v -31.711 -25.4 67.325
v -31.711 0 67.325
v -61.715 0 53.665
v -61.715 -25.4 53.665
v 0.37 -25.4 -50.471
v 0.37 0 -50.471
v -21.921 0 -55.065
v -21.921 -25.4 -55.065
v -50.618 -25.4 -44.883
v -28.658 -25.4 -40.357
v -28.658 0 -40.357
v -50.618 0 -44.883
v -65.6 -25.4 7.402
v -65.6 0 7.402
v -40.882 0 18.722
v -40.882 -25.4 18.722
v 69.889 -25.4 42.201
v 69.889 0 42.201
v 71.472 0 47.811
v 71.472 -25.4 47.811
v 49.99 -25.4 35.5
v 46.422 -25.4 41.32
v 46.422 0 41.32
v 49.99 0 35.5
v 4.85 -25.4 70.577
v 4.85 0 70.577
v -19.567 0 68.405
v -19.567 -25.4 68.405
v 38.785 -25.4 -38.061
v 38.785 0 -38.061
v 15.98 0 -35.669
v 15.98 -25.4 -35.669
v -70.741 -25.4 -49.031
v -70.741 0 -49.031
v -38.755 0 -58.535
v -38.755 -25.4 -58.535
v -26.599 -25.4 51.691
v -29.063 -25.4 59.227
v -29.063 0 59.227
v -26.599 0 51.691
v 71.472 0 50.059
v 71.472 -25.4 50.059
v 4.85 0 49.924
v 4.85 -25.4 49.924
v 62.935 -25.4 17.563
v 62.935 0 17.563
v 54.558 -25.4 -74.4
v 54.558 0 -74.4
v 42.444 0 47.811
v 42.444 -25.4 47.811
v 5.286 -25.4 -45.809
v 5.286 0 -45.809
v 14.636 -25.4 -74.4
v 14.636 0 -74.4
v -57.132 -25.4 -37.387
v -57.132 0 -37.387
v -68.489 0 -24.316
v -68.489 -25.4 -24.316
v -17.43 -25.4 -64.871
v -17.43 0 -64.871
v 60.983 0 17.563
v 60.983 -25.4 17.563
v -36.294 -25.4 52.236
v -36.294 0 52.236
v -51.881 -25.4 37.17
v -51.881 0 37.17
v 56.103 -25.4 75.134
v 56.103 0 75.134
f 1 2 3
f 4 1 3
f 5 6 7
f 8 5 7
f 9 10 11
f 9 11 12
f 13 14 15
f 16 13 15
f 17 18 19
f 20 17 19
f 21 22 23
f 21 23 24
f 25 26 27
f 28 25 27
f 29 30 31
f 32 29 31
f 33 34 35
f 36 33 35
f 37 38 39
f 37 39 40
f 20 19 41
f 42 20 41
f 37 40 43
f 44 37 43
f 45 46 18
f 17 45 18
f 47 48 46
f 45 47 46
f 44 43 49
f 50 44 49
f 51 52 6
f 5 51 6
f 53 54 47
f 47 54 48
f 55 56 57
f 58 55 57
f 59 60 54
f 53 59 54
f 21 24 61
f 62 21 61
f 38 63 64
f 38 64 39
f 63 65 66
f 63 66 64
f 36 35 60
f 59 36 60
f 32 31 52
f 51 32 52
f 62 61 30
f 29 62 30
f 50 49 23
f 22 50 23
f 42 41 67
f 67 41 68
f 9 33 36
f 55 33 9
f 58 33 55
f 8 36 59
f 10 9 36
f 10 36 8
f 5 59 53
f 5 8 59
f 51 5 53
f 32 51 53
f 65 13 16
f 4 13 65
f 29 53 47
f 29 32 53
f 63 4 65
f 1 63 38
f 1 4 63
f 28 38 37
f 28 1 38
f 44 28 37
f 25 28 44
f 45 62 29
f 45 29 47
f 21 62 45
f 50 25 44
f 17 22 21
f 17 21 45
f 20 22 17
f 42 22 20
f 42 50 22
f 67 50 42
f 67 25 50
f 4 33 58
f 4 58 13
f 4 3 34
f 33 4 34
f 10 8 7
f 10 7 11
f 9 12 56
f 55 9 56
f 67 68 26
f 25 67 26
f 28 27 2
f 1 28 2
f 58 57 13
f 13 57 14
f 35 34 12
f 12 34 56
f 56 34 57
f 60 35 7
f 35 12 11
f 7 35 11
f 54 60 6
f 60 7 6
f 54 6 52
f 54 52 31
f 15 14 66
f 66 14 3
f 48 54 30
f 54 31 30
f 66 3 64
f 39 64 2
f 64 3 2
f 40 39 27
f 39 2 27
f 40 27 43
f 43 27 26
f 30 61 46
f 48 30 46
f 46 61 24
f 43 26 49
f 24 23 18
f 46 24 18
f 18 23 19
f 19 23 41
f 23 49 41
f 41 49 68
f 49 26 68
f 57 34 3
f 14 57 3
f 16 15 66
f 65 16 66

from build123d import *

# Parameters (mm, degrees)
F1_DEPTH = 25.4


with BuildPart() as f1:
    # F0 (on Front) → F1 (new body)
    with BuildSketch(Plane.XZ):
        Polygon((-29.0627366167, 59.2265195809), (-26.5986134675, 51.6914901655), (4.8500286105, 49.9238849428), (4.8500286105, 70.576620616), (-19.5671229655, 68.4053798518), align=None)
        Polygon((31.3274671897, 72.9310678085), (4.8500286105, 49.9238849428), (42.4443297088, 47.8108562529), align=None)
        Polygon((4.8500286105, 70.576620616), (4.8500286105, 49.9238849428), (31.3274671897, 72.9310678085), align=None)
        Polygon((-36.2940447313, 52.2364324526), (-29.0627366167, 59.2265195809), (-31.7112803459, 67.3254877329), (-61.7150329053, 53.6652468145), align=None)
        Polygon((-31.7112803459, 67.3254877329), (-29.0627366167, 59.2265195809), (-19.5671229655, 68.4053798518), align=None)
        Polygon((-51.8806073309, 37.1698042746), (-36.2940447313, 52.2364324526), (-61.7150329053, 53.6652468145), align=None)
        Polygon((-65.600423, 7.4018295103), (-40.8824269365, 18.7223767795), (-51.8806073309, 37.1698042746), (-61.7150329053, 53.6652468145), (-70.7405507565, -49.0305200219), (-68.4894029233, -24.315655452), align=None)
        Polygon((71.4723467827, 47.8108562529), (42.4443297088, 47.8108562529), (46.4224250242, 41.3202796856), (69.8888571857, 42.2007769877), align=None)
        Polygon((56.1034718341, 75.1342187818), (42.4443297088, 47.8108562529), (71.4723467827, 47.8108562529), (71.4723467827, 50.058685971), align=None)
        Polygon((31.3274671897, 72.9310678085), (42.4443297088, 47.8108562529), (56.1034718341, 75.1342187818), align=None)
        Polygon((69.8888571857, 42.2007769877), (46.4224250242, 41.3202796856), (49.9897200646, 35.4999561987), align=None)
        Polygon((15.9801721379, -35.6691343344), (5.2863502547, -45.8093752593), (14.6359754726, -74.3995457888), (38.7853346765, -38.0608700216), align=None)
        Polygon((14.6359754726, -74.3995457888), (5.2863502547, -45.8093752593), (0.3700881163, -50.4711400688), align=None)
        Polygon((-57.13157103, -37.3866297692), (-68.4894029233, -24.315655452), (-70.7405507565, -49.0305200219), align=None)
        Polygon((-57.13157103, -37.3866297692), (-70.7405507565, -49.0305200219), (-50.6175059134, -44.8832346352), align=None)
        Polygon((-50.6175059134, -44.8832346352), (-70.7405507565, -49.0305200219), (-38.7552418775, -58.5347263998), align=None)
        Polygon((69.8888571857, 42.2007769877), (49.9897200646, 35.4999561987), (60.9832331538, 17.5631716847), (62.9346966743, 17.5631716847), align=None)
        Polygon((-17.4304527242, -64.8712353842), (14.6359754726, -74.3995457888), (0.3700881163, -50.4711400688), (-21.9214353892, -55.0653409168), align=None)
        Polygon((38.7853346765, -38.0608700216), (14.6359754726, -74.3995457888), (54.5582934135, -74.3995457888), align=None)
        Polygon((-21.9214353892, -55.0653409168), (-28.6575145446, -40.3573613388), (-50.6175059134, -44.8832346352), (-38.7552418775, -58.5347263998), align=None)
        Polygon((60.9832331538, 17.5631716847), (38.7853346765, -38.0608700216), (54.5582934135, -74.3995457888), (62.9346966743, 17.5631716847), align=None)
        Polygon((-21.9214353892, -55.0653409168), (-38.7552418775, -58.5347263998), (-17.4304527242, -64.8712353842), align=None)
    extrude(amount=F1_DEPTH)


solid = f1.part
